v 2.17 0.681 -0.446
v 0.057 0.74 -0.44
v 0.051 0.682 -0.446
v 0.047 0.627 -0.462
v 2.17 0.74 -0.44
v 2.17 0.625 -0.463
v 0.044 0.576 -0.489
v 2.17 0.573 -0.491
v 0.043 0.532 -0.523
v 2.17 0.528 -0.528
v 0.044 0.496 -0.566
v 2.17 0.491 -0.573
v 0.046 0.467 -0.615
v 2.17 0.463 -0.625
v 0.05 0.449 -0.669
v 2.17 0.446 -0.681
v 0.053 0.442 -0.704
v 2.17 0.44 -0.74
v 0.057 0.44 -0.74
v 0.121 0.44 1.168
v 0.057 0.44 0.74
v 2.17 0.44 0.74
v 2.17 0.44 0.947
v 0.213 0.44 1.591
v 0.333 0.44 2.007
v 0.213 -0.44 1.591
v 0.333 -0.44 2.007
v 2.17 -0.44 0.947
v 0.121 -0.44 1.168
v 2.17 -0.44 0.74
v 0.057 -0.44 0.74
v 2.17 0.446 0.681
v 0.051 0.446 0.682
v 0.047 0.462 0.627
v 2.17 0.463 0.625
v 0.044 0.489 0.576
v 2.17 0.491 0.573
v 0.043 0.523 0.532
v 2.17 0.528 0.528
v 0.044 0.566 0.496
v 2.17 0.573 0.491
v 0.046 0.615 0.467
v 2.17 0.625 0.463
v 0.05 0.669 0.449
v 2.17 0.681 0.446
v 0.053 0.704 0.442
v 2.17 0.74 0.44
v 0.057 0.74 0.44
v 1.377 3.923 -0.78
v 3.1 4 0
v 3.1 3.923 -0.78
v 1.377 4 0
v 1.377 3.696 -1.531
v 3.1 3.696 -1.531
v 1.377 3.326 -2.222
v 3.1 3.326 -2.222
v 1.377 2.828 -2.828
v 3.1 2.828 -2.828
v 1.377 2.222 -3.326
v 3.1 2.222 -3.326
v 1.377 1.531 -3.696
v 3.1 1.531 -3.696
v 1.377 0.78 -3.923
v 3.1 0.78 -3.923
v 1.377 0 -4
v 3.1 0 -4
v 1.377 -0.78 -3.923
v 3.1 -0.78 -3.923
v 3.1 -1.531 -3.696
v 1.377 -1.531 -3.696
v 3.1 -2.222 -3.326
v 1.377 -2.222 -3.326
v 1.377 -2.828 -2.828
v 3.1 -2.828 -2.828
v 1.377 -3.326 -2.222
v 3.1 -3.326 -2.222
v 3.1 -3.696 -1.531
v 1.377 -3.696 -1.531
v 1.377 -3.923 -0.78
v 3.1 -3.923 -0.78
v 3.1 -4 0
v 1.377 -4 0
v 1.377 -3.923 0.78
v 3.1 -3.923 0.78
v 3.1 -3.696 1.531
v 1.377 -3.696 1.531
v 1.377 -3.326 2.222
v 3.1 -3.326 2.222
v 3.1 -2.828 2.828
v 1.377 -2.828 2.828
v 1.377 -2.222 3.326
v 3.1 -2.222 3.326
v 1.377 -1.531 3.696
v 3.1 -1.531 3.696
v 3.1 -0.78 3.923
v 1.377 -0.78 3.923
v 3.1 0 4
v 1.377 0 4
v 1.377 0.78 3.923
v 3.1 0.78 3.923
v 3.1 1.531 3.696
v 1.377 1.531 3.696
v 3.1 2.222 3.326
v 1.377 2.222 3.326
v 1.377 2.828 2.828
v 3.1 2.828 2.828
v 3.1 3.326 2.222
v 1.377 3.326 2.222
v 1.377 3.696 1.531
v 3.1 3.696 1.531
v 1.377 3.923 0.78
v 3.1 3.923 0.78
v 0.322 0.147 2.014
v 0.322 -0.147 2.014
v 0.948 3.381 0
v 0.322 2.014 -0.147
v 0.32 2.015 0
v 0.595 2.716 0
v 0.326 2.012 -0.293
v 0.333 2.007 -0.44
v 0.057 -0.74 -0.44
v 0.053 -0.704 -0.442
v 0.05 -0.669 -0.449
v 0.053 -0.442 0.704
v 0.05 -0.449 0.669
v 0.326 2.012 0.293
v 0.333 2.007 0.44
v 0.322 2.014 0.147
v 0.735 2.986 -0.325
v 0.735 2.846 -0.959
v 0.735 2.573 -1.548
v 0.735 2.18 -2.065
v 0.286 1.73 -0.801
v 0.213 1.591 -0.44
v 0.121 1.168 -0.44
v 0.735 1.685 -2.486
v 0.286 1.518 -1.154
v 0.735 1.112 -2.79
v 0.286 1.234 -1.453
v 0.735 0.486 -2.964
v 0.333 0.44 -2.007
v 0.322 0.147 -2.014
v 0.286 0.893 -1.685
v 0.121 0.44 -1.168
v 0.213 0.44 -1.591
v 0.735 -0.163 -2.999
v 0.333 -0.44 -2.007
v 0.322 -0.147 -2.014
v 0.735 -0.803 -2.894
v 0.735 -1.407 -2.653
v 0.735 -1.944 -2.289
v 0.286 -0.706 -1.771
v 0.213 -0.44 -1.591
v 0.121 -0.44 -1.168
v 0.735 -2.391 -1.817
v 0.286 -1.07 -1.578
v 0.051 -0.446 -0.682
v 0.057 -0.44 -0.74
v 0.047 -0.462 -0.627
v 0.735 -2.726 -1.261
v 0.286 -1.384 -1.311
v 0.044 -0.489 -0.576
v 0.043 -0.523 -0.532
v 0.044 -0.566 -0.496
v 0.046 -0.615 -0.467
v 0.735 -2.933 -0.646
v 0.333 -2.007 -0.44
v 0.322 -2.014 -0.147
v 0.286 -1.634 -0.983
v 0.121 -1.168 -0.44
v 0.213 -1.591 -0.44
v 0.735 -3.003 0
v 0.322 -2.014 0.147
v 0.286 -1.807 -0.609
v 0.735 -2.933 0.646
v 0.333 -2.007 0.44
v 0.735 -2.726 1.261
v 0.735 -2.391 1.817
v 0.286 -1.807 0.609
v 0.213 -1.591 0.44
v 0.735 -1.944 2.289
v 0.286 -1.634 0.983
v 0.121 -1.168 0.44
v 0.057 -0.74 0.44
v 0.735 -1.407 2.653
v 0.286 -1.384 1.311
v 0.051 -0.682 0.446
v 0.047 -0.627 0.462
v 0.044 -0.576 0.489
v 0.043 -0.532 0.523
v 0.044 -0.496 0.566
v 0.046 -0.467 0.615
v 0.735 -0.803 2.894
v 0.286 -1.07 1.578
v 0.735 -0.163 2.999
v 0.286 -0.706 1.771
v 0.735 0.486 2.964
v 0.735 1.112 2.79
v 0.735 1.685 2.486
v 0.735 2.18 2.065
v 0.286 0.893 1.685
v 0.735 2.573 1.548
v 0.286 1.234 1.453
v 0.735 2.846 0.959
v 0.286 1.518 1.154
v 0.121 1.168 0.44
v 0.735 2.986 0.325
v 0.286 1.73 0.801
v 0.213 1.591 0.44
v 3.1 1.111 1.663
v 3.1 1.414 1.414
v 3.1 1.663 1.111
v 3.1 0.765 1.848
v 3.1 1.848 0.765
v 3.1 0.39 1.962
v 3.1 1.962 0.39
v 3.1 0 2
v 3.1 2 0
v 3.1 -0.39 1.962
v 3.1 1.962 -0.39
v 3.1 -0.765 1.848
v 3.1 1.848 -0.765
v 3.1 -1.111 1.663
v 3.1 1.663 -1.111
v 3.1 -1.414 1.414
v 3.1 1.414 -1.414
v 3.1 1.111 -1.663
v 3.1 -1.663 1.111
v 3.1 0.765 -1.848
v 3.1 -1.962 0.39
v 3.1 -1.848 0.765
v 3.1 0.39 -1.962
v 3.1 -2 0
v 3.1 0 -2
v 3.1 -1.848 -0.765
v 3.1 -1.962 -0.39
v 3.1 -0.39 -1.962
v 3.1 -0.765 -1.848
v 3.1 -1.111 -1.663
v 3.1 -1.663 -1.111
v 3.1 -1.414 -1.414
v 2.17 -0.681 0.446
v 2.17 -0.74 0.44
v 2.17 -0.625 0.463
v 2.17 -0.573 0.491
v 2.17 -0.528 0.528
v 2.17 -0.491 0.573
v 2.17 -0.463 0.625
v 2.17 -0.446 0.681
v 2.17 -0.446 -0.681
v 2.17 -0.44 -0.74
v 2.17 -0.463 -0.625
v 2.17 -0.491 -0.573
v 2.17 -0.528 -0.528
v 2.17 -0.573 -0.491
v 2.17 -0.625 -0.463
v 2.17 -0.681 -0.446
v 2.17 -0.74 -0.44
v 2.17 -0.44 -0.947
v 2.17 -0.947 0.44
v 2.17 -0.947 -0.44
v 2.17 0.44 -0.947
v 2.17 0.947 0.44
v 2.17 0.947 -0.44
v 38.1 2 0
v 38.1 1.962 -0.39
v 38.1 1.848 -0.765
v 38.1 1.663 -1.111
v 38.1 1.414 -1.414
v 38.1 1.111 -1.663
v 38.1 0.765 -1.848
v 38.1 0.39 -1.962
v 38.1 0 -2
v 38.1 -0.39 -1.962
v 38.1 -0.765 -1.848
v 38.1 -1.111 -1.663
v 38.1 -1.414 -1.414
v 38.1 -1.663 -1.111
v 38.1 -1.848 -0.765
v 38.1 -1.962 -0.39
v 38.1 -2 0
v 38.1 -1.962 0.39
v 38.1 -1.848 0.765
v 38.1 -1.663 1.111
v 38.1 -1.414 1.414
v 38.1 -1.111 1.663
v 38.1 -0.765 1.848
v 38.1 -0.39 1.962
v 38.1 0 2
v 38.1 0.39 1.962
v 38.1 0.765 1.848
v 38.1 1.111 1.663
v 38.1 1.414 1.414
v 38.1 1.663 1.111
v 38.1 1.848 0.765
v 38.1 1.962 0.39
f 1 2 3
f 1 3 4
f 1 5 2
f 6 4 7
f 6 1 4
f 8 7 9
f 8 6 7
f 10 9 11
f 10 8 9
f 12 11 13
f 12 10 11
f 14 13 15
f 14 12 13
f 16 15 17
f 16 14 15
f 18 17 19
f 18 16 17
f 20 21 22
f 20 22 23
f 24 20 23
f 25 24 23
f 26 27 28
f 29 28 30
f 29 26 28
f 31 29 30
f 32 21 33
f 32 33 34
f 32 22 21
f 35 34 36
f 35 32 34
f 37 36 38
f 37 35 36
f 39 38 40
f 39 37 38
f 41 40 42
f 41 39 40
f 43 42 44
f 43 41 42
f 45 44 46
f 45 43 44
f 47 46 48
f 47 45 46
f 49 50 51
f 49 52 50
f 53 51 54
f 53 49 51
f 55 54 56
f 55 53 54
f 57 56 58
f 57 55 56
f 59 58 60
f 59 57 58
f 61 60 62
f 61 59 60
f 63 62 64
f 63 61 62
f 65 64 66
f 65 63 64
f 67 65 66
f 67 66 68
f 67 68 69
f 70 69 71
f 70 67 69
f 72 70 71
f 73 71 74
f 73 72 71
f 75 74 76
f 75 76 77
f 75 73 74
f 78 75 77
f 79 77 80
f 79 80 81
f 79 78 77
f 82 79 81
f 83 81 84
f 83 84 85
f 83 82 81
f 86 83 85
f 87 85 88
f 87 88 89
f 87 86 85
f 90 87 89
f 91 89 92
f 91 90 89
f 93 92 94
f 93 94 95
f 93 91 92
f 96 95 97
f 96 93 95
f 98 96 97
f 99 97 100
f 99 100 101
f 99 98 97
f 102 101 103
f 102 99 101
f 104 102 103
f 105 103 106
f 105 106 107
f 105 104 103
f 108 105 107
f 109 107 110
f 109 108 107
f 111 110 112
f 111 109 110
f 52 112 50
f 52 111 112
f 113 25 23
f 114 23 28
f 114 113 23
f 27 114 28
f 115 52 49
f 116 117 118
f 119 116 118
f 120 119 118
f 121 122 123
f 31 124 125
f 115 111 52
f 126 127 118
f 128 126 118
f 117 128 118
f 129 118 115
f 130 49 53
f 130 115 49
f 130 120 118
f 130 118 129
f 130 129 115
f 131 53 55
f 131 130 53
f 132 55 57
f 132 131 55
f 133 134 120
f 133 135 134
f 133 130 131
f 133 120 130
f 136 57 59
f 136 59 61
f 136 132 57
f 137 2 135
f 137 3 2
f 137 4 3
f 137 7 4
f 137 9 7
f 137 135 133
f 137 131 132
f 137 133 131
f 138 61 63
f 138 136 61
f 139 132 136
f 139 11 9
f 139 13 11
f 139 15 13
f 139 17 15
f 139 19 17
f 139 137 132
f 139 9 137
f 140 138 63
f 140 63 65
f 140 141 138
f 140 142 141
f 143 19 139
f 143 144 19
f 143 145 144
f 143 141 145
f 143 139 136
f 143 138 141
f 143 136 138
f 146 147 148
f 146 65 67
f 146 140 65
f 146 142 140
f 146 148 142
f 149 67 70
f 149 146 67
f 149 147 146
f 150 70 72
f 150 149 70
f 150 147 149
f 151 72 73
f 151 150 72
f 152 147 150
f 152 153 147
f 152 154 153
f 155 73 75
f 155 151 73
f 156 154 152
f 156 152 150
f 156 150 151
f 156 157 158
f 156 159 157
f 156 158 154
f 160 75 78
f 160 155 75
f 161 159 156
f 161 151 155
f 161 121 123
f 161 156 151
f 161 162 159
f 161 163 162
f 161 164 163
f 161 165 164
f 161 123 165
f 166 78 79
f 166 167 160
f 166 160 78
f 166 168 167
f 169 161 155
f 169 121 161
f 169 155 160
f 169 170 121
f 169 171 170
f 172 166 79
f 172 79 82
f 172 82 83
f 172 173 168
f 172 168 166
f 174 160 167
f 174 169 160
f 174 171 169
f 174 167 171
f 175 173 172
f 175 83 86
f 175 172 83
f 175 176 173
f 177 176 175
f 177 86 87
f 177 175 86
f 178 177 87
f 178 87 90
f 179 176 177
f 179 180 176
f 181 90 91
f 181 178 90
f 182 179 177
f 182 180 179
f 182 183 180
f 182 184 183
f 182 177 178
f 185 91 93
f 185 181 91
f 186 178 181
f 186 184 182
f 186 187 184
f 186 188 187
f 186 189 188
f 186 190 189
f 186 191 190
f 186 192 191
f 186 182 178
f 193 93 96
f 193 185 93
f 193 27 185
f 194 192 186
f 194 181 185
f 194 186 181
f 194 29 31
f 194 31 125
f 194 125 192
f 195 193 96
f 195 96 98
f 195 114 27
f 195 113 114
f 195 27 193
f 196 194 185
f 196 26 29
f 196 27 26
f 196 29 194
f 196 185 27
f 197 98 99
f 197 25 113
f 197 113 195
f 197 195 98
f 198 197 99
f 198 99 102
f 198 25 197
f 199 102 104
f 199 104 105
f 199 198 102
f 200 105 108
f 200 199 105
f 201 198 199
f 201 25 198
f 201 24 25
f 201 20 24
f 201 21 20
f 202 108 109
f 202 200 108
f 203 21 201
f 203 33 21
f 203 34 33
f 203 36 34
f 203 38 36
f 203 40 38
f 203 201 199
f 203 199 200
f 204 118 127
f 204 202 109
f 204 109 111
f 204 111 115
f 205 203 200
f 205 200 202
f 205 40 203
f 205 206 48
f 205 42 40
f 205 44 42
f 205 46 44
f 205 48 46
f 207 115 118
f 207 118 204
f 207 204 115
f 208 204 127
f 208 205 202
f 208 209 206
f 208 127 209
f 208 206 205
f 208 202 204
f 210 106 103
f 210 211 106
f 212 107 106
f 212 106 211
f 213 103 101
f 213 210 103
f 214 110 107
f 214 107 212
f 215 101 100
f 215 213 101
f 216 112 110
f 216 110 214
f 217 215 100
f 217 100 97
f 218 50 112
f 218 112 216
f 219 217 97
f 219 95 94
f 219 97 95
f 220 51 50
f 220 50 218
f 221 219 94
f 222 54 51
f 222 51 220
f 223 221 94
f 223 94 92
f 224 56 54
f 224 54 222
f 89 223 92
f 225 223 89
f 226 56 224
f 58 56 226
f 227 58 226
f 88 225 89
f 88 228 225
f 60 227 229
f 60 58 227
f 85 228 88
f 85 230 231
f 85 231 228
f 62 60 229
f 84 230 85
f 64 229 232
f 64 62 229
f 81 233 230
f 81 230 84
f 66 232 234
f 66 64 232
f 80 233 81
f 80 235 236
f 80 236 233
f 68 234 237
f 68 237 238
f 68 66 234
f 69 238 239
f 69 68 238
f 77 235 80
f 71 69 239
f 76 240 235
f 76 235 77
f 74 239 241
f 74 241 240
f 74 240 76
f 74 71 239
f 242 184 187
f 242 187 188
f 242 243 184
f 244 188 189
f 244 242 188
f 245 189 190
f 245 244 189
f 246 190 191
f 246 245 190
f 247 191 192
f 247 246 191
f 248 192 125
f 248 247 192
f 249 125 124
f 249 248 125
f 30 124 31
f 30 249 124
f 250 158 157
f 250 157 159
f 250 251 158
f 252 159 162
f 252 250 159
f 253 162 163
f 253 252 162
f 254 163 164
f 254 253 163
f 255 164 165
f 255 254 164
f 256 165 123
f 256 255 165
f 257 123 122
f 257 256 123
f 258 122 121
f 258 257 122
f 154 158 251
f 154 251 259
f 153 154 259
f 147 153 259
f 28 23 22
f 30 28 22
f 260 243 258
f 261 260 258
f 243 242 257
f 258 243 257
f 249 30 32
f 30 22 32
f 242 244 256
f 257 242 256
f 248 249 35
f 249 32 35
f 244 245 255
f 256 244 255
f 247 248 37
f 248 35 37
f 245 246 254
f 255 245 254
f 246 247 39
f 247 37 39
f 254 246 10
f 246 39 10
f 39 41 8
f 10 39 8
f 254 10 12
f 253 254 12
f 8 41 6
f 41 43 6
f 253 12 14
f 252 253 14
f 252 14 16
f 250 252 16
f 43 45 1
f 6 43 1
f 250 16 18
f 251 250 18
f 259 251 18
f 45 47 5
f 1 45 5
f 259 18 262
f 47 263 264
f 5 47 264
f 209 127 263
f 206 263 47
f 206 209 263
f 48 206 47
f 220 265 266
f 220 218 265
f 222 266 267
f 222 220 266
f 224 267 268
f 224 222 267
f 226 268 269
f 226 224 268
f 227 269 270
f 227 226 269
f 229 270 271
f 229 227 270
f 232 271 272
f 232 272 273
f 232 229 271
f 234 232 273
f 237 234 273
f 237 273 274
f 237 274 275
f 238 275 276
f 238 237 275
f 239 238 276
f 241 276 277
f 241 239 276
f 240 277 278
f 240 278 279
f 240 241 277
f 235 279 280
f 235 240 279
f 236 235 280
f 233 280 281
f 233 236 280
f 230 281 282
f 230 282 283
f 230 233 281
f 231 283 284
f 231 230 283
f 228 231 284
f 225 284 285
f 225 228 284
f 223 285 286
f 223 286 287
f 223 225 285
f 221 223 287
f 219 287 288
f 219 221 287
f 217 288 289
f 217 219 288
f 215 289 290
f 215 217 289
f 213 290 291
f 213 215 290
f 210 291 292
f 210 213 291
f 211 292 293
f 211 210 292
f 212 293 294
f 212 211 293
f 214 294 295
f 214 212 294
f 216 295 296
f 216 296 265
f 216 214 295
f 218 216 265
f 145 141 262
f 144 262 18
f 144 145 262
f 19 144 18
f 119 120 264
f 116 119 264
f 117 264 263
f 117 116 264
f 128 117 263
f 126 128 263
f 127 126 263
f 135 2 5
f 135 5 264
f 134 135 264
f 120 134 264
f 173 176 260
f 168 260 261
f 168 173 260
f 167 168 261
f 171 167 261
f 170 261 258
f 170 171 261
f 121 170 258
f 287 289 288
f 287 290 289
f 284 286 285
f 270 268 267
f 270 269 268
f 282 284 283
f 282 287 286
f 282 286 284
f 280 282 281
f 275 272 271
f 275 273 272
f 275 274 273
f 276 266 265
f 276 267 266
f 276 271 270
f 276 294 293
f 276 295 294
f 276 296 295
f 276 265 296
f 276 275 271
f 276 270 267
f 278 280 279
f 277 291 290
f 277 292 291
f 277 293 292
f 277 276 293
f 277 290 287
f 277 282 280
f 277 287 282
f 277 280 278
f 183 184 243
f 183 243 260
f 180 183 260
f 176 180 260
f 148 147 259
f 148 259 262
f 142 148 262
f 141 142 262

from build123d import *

# Parameters (mm, degrees)
CROSSRECESS_DEPTH = 2.17
FILLET5_R         = 0.3
DRAFT1_ANGLE      = -30


with BuildPart() as part:
    # Sketch1 → Base (revolve)
    with BuildSketch(Plane.XY):
        with BuildLine():
            Line((38.1, 2), (4.5, 2))
            Line((4.5, 2), (3.1, 2))
            Line((3.1, 2), (3.1, 2.35))
            Line((3.1, 2.35), (3.1, 4))
            Line((3.1, 4), (1.376524617, 4))
            ThreePointArc((1.376524617, 4), (0.353757652, 2.115113473), (0, 0))
            Line((0, 0), (38.1, 0))
            Line((38.1, 0), (38.1, 2))
        make_face()
    revolve(axis=Axis((4.515812911, 0, 0), (-1, 0, 0)))

    # Sketch6 → CrossRecess (cut)
    with BuildSketch(Plane(origin=(0, 0, 0), x_dir=(0, 0, -1), z_dir=(1, 0, 0))):
        Polygon((0.44, 0.44), (0.44, 2.2), (-0.44, 2.2), (-0.44, 0.44), (-2.2, 0.44), (-2.2, -0.44), (-0.44, -0.44), (-0.44, -2.2), (0.44, -2.2), (0.44, -0.44), (2.2, -0.44), (2.2, 0.44), align=None)
    extrude(amount=CROSSRECESS_DEPTH, mode=Mode.SUBTRACT)

    # Fillet5
    fillet5_edges = [part.edges().sort_by_distance(p)[0] for p in [
        (1.099926585, 0.44, 0.44),
        (1.099926585, -0.44, 0.44),
        (1.099926585, -0.44, -0.44),
        (1.099926585, 0.44, -0.44),
    ]]
    fillet(fillet5_edges, radius=FILLET5_R)

    # Draft1
    draft1_faces = [part.faces().sort_by_distance(p)[0] for p in [
        (1.27944778, -2.2, 0),
        (1.27944778, 0, -2.2),
        (1.27944778, 0, 2.2),
        (1.27944778, 2.2, 0),
    ]]
    draft(draft1_faces, Plane(origin=(0, 0, 0), x_dir=(0, 0, 1), z_dir=(1, 0, 0)), DRAFT1_ANGLE)


solid = part.part
